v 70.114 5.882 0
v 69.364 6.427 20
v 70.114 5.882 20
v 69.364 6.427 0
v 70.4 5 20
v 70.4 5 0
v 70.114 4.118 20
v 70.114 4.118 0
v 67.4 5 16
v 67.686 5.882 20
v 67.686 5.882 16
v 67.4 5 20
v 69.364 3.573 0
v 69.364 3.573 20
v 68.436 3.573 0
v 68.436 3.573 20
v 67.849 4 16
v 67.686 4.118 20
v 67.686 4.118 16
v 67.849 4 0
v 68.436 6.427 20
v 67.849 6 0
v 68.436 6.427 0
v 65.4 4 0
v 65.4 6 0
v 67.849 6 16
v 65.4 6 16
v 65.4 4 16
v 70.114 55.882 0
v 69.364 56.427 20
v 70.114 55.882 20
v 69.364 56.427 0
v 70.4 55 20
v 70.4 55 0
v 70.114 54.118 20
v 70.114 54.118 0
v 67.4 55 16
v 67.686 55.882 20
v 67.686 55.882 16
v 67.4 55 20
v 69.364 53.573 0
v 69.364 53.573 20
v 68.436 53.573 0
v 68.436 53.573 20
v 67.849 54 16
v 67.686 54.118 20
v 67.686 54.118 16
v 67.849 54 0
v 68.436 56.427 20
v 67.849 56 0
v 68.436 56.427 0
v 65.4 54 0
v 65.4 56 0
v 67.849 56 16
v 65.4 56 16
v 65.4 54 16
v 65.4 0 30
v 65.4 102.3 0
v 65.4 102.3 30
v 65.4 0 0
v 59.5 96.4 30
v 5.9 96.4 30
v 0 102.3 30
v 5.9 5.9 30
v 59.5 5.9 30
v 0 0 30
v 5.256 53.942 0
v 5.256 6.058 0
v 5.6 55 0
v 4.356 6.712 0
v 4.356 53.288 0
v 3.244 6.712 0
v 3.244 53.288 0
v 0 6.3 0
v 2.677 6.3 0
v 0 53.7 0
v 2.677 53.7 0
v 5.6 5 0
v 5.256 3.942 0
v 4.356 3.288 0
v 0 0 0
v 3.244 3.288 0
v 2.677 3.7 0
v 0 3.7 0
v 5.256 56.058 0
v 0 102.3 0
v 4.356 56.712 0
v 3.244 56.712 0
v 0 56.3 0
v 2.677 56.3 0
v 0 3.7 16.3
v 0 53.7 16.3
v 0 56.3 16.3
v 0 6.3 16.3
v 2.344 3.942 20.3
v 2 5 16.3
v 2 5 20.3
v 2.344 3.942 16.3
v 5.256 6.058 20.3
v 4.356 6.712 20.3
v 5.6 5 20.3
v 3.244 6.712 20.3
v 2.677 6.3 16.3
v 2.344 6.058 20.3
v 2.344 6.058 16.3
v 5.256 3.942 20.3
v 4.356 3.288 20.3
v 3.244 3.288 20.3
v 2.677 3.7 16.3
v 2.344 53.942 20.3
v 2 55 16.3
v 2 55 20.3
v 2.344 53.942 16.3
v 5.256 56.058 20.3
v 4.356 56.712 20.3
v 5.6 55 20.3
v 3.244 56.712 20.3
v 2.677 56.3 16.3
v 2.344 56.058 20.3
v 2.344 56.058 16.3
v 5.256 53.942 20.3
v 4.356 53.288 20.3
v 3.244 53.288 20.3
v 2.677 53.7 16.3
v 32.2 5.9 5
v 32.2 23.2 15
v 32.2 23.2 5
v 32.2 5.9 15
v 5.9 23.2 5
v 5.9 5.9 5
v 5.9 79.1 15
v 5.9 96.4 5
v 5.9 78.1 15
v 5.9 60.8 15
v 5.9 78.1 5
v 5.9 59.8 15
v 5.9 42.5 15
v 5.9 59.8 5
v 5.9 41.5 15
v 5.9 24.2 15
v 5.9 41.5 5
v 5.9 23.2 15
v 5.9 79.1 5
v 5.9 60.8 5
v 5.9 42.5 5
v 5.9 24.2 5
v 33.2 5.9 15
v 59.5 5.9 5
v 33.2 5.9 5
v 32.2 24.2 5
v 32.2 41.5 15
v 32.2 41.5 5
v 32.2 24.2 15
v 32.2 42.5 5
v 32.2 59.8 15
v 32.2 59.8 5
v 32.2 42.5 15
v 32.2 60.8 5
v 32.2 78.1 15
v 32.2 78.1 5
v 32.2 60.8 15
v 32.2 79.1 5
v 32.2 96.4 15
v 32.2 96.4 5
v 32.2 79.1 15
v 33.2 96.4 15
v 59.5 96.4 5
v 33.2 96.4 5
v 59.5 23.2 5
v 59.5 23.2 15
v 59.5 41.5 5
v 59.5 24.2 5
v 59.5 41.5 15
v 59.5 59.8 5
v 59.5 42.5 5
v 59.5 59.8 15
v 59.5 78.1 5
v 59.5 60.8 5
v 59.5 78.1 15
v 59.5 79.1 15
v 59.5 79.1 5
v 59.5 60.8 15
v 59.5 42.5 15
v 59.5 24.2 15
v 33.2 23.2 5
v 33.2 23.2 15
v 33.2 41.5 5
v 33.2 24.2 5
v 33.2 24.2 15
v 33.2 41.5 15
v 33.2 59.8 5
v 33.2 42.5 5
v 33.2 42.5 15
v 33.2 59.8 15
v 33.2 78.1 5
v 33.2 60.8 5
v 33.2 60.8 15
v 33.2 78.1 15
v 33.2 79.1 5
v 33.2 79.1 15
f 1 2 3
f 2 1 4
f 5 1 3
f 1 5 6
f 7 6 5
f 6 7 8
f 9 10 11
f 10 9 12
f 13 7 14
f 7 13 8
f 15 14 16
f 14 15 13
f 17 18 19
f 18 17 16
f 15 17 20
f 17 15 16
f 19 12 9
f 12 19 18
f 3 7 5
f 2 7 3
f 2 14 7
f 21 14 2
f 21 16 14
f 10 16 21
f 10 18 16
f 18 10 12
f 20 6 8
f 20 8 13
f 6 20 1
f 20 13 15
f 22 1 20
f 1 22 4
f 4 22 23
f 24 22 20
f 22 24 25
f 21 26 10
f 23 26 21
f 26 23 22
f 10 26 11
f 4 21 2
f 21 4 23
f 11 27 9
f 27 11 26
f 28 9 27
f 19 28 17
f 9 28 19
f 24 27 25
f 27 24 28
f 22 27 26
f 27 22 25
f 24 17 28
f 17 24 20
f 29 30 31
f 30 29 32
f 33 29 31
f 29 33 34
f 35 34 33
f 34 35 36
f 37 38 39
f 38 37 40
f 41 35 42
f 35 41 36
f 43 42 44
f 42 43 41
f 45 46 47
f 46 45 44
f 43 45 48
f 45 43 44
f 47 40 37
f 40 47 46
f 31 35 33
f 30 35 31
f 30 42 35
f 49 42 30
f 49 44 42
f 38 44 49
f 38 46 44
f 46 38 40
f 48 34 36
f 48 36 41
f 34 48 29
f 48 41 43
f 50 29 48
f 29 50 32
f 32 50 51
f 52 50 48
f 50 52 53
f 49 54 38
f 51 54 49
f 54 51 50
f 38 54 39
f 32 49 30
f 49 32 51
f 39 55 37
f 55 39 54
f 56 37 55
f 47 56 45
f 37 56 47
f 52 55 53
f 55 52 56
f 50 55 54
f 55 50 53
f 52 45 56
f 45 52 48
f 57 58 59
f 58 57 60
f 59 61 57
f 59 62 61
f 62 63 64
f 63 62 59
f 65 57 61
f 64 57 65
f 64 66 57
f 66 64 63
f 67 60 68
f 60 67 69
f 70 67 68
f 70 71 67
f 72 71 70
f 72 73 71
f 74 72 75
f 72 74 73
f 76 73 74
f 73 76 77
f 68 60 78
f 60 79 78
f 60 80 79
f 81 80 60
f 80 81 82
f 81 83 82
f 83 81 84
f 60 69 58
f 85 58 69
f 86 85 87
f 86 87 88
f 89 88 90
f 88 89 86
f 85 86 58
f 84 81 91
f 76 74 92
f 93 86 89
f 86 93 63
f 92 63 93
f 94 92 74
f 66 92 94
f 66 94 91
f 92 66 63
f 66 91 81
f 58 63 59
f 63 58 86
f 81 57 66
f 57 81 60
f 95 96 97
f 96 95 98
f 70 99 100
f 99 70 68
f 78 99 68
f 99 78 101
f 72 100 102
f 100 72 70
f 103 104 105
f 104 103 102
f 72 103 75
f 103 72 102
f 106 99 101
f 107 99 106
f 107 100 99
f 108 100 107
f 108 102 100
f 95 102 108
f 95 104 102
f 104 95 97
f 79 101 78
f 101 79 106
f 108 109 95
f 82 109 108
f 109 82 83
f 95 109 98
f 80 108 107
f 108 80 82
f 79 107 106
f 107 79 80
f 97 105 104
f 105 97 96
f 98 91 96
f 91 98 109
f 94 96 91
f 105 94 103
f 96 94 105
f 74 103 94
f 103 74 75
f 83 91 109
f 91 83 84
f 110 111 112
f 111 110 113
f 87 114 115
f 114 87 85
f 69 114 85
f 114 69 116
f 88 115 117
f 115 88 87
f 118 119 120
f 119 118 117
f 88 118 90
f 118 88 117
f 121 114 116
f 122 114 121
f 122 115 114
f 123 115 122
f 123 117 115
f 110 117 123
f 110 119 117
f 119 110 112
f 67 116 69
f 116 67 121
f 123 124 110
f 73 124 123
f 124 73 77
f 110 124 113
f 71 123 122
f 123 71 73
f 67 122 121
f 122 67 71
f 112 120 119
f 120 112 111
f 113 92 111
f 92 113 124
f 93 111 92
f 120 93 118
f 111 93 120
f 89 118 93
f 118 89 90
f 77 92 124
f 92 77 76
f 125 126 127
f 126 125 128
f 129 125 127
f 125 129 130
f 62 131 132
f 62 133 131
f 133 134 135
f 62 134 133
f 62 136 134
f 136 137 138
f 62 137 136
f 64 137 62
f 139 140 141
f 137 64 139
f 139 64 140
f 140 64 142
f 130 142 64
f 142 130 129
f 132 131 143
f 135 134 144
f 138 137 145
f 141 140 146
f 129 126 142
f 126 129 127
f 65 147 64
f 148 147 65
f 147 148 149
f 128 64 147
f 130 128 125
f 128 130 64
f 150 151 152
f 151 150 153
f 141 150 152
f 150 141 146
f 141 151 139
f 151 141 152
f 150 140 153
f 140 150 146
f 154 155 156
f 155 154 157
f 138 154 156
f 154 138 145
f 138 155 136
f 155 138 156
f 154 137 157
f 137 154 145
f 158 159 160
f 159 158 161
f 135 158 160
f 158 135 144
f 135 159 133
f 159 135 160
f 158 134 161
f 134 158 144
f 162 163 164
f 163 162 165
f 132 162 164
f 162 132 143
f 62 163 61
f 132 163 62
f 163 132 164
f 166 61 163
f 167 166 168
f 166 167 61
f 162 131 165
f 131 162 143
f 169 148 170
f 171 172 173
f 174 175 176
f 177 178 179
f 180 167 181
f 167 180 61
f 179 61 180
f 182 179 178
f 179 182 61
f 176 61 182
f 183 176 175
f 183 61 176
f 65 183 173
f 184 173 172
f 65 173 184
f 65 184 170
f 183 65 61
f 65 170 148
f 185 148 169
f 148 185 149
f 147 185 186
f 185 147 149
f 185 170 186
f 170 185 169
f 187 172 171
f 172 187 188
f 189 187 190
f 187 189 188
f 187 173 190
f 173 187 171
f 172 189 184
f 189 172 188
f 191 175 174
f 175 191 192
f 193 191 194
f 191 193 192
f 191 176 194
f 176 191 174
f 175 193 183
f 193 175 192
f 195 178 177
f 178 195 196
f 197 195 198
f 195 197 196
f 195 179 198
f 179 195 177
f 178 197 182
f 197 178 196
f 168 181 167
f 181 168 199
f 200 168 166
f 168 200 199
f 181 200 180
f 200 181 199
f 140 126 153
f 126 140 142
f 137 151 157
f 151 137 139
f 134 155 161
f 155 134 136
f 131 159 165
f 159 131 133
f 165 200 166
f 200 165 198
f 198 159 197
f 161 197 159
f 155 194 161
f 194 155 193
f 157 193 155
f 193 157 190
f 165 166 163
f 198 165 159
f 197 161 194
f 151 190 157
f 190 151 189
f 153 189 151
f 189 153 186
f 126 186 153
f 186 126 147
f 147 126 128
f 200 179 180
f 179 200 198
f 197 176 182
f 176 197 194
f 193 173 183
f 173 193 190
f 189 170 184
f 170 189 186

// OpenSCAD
type="block"; // "bundle" OR "cylinder" OR "block"

bundle_width_count=4;
bundle_length_count=1;

battery_diameter=14;

battery_width=26;
battery_length=17;

battery_bundle_spacing=0;
battery_clearance=0.3;

battery_diameter_w_clearance=battery_diameter+battery_clearance;

battery_width_w_clearance=battery_width+battery_clearance;
battery_length_w_clearance=battery_length+battery_clearance;

bundle_width=bundle_width_count*battery_diameter+battery_bundle_spacing*(bundle_width_count-1)+battery_clearance*2;
bundle_length=bundle_length_count*battery_diameter+battery_bundle_spacing*(bundle_length_count-1)+battery_clearance*2;

battbox_count_wide=2;
battbox_count_long=5;

battbox_spacing=1;
battbox_height=30;

joint_height=battbox_height * 2/3;
joint_diameter=3;
joint_setback=2;
joint_setback_width=2;
joint_setback_height=joint_height * 4/5;
joint_offset=5;
joint_spacing=50;
joint_v_clearance=0.3;
joint_d_clearance=0.3;

joint_max=1000;

battbox_edge_width_extra=0.3;
battbox_edge_width=joint_setback+joint_diameter+joint_d_clearance*2+battbox_edge_width_extra;
battbox_base_thickness=5;

function battbox_dimension(sizing, count) =
    sizing*count+battbox_spacing*(count-1)+battbox_edge_width*2;

battbox_width_w_bundle=battbox_dimension(bundle_width, battbox_count_wide);
battbox_length_w_bundle=battbox_dimension(bundle_length,battbox_count_long);

battbox_width_w_cylinder=battbox_dimension(battery_diameter+battery_clearance,battbox_count_wide);
battbox_length_w_cylinder=battbox_dimension(battery_diameter+battery_clearance,battbox_count_long);

battbox_width_w_block=battbox_dimension(battery_width+battery_clearance,battbox_count_wide);
battbox_length_w_block=battbox_dimension(battery_length+battery_clearance,battbox_count_long);

function battbox_width() =
    type == "bundle"   ? battbox_width_w_bundle   :
    type == "cylinder" ? battbox_width_w_cylinder :
 /* type == "block" */   battbox_width_w_block;
function battbox_length() =
    type == "bundle"   ? battbox_length_w_bundle   :
    type == "cylinder" ? battbox_length_w_cylinder :
 /* type == "block" */   battbox_length_w_block;

battery_cut_height=battbox_height*2;
battbox_inset_height=battbox_height*1/3;

battbox_inset_width=battbox_width() - battbox_edge_width*2;
battbox_inset_length=battbox_length() - battbox_edge_width*2;

function joint_count() =
    min(joint_max,floor((battbox_length() - joint_offset*2) / joint_spacing)+1);

module joint(cv,cd) {
    union() {
        translate([joint_diameter/2+cd+joint_setback,0,0])
        cylinder(joint_height+cv,d=joint_diameter+cd*2,$fn=10);

        translate([0,-(joint_setback_width/2+cd),0])
        cube([joint_setback+joint_diameter/2+cd,joint_setback_width+cd*2,joint_setback_height+cv]);
    }
}

module joints(cv,cd) {
    union() {
        for (j = [0:joint_count()-1]) {
            translate([0,joint_spacing*j,0])
            joint(cv,cd);
        }
    }
}

module joint_tabs() {
    translate([battbox_width(),joint_offset,0])
    joints(0,0);
}

module joint_sockets() {
    translate([0,joint_offset,0])
    joints(joint_v_clearance, joint_d_clearance);
}

module battbox_inset_cutout() {
    if (type == "bundle" || type == "cylinder") {
        translate([0,0,battbox_base_thickness+battbox_inset_height])
        union() {
            translate([battery_diameter/2,battery_diameter/2,0])
            cylinder(battery_cut_height,d=battery_diameter+battery_clearance*2);
            
            translate([battbox_inset_width-battery_diameter/2,battery_diameter/2,0])
            cylinder(battery_cut_height,d=battery_diameter+battery_clearance*2);
            
            translate([battery_diameter/2,battbox_inset_length-battery_diameter/2,0])
            cylinder(battery_cut_height,d=battery_diameter+battery_clearance*2);
            
            translate([battbox_inset_width-battery_diameter/2,battbox_inset_length-battery_diameter/2,0])
            cylinder(battery_cut_height,d=battery_diameter+battery_clearance*2);
            
            translate([0,battery_diameter/2,0])
            cube([battbox_inset_width,battbox_inset_length-battery_diameter,battery_cut_height]);
            
            translate([battery_diameter/2,0,0])
            cube([battbox_inset_width-battery_diameter,battbox_inset_length,battery_cut_height]);
        }
    }
    else if (type == "block") {
        translate([0,0,battbox_base_thickness+battbox_inset_height])
        cube([battbox_inset_width,battbox_inset_length,battery_cut_height]);
    }
}

module bundle_slot() {
    translate([0,0,battbox_base_thickness])
    union() {
        translate([battery_diameter/2,battery_diameter/2,0])
        cylinder(battery_cut_height,d=battery_diameter+battery_clearance*2);
        
        translate([bundle_width-battery_diameter/2,battery_diameter/2,0])
        cylinder(battery_cut_height,d=battery_diameter+battery_clearance*2);
        
        translate([battery_diameter/2,bundle_length-battery_diameter/2,0])
        cylinder(battery_cut_height,d=battery_diameter+battery_clearance*2);
        
        translate([bundle_width-battery_diameter/2,bundle_length-battery_diameter/2,0])
        cylinder(battery_cut_height,d=battery_diameter+battery_clearance*2);
        
        translate([0,battery_diameter/2,0])
        cube([bundle_width,bundle_length-battery_diameter,battery_cut_height]);
        
        translate([battery_diameter/2,0,0])
        cube([bundle_width-battery_diameter,bundle_length,battery_cut_height]);
    }
}

module cylinder_slot() {
    translate([battery_diameter_w_clearance/2,battery_diameter_w_clearance/2,battbox_base_thickness])
    cylinder(battery_cut_height,d=battery_diameter_w_clearance);
}

module box_slot() {
    translate([0,0,battbox_base_thickness])
    cube([battery_width_w_clearance,battery_length_w_clearance,battery_cut_height]);
}

module slot(w,l) {
    if (type == "bundle") {
        translate([battbox_edge_width+(bundle_width+battbox_spacing)*(w-1),battbox_edge_width+(bundle_length+battbox_spacing)*(l-1),0])
        bundle_slot();
    }
    
    else if (type == "cylinder") {
        translate([battbox_edge_width+(battery_diameter_w_clearance+battbox_spacing)*(w-1),battbox_edge_width+(battery_diameter_w_clearance+battbox_spacing)*(l-1),0])
        cylinder_slot();
    }
    else if (type == "block") {
        translate([battbox_edge_width+(battery_width_w_clearance+battbox_spacing)*(w-1),battbox_edge_width+(battery_length_w_clearance+battbox_spacing)*(l-1),0])
        box_slot();
    }
}

module battery_box() {
    difference() {
        union() {
            cube([battbox_width(),battbox_length(),battbox_height]);       
    
            joint_tabs();
        }

        joint_sockets();

        translate([battbox_edge_width,battbox_edge_width,0])
        battbox_inset_cutout();
    
        for (w = [1:battbox_count_wide]) {
            for(l = [1:battbox_count_long]) {
                slot(w,l);
            }
        }
    }
}

battery_box();
